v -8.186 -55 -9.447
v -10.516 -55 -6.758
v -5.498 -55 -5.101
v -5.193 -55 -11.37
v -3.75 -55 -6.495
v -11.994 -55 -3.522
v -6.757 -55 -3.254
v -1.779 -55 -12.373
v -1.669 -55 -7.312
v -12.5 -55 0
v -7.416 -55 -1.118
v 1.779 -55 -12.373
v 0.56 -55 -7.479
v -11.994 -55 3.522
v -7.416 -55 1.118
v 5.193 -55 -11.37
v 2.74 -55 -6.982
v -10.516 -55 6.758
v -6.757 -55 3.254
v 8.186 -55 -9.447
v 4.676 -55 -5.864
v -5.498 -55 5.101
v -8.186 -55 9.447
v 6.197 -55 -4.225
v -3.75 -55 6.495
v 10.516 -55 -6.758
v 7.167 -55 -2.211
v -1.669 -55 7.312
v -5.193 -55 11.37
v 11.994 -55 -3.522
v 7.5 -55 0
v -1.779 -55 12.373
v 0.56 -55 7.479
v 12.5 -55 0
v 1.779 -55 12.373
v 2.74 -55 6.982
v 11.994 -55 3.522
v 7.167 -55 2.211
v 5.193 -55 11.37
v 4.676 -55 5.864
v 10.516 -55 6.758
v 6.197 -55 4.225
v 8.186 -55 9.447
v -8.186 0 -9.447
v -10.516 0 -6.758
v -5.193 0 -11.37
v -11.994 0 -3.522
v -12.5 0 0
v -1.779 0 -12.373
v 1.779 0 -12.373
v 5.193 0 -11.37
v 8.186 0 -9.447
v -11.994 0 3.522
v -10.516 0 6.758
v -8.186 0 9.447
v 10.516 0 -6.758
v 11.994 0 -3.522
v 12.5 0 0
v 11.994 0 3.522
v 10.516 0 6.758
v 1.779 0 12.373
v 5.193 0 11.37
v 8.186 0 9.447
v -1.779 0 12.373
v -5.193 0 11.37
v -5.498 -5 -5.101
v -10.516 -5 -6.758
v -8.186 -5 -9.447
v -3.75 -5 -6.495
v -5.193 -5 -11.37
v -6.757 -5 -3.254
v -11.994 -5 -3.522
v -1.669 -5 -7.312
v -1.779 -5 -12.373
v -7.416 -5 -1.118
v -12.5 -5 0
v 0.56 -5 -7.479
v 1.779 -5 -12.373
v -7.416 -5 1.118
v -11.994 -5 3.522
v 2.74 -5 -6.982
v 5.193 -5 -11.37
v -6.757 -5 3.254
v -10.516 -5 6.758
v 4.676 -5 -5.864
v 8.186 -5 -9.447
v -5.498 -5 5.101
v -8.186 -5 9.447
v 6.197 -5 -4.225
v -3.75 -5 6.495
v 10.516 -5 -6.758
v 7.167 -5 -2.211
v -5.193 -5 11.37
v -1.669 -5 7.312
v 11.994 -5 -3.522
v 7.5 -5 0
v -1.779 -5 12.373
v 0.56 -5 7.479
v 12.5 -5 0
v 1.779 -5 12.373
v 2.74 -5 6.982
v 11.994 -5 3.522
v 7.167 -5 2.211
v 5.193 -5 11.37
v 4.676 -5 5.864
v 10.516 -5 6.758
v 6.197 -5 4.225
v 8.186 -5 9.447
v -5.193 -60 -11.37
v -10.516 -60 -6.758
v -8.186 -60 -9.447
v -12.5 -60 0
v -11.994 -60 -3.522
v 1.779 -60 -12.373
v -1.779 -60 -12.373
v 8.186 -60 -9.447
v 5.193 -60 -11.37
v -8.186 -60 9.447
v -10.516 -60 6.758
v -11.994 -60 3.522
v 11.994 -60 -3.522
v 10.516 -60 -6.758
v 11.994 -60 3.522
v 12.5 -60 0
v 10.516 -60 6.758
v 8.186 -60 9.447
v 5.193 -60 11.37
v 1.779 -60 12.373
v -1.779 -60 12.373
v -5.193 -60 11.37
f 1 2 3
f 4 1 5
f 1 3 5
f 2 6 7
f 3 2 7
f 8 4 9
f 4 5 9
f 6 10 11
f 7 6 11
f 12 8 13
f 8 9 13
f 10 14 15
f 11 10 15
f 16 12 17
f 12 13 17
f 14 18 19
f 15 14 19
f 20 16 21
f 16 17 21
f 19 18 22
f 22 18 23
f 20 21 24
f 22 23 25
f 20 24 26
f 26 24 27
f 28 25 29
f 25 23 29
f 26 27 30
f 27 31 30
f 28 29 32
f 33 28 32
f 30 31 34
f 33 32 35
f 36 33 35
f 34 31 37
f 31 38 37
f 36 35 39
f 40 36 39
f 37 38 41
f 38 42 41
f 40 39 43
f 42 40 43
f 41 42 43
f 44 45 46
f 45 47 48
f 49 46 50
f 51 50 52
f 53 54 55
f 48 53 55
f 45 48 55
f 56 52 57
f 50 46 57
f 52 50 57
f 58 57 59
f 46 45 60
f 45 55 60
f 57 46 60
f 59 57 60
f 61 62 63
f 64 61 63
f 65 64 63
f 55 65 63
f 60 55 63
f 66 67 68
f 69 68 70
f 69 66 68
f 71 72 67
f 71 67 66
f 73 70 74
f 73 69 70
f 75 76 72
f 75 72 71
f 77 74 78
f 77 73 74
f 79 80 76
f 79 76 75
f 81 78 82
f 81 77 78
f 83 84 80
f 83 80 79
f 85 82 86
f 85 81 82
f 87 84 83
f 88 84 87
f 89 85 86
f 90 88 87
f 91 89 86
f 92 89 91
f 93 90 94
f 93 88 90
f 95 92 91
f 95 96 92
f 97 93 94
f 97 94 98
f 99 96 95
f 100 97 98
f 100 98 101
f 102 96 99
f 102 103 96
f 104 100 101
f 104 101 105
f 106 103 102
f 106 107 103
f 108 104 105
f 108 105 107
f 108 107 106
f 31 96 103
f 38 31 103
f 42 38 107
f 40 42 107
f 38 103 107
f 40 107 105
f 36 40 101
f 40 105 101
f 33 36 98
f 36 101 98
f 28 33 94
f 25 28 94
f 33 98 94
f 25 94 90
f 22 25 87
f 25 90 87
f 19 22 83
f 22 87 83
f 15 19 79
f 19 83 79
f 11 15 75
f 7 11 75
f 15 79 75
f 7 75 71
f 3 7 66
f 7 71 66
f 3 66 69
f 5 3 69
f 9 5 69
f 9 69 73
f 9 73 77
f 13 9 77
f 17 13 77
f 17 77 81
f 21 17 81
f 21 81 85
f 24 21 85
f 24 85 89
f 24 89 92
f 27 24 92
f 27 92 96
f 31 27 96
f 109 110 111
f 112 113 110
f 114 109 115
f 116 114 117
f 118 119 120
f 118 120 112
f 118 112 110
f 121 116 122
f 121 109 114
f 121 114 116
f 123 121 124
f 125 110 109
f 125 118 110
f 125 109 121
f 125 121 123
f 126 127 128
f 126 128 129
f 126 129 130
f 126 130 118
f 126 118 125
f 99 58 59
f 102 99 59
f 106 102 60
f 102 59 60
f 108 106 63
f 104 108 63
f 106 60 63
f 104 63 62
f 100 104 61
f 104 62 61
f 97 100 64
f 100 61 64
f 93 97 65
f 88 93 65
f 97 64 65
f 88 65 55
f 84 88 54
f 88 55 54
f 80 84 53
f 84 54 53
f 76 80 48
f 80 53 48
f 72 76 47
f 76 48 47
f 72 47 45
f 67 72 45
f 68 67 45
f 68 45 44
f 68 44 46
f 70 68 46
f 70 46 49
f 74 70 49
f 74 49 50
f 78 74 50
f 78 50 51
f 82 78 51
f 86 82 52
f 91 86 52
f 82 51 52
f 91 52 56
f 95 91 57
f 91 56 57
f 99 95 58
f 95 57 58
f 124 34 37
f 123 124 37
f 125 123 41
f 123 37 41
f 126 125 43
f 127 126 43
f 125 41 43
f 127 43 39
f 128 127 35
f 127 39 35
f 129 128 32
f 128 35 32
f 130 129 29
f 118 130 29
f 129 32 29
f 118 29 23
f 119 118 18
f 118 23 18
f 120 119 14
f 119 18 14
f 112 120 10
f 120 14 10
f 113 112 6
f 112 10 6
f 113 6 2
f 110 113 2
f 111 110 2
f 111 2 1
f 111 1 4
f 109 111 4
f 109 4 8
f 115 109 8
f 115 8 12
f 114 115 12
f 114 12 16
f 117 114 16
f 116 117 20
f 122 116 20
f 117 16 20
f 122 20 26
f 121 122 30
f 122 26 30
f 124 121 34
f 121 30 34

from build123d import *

# Parameters (mm, degrees)
F0_R     = 7.5
F1_DEPTH = 60
F0_R_2   = 12.5
F2_DEPTH = 5
F3_START = 55
F3_DEPTH = 5


with BuildPart() as f1:
    # F0 (on Front) → F1 (new body)
    with BuildSketch(Plane.XZ):
        Circle(F0_R)
    extrude(amount=F1_DEPTH)

    # F0 (on Front) → F2 (join)
    with BuildSketch(Plane.XZ):
        Circle(F0_R_2)
        Circle(F0_R, mode=Mode.SUBTRACT)
    extrude(amount=F2_DEPTH)

    # F0 (on Front) → F3 (join)
    with BuildSketch(Plane.XZ.offset(F3_START)):
        Circle(F0_R_2)
        Circle(F0_R, mode=Mode.SUBTRACT)
    extrude(amount=F3_DEPTH)


solid = f1.part
